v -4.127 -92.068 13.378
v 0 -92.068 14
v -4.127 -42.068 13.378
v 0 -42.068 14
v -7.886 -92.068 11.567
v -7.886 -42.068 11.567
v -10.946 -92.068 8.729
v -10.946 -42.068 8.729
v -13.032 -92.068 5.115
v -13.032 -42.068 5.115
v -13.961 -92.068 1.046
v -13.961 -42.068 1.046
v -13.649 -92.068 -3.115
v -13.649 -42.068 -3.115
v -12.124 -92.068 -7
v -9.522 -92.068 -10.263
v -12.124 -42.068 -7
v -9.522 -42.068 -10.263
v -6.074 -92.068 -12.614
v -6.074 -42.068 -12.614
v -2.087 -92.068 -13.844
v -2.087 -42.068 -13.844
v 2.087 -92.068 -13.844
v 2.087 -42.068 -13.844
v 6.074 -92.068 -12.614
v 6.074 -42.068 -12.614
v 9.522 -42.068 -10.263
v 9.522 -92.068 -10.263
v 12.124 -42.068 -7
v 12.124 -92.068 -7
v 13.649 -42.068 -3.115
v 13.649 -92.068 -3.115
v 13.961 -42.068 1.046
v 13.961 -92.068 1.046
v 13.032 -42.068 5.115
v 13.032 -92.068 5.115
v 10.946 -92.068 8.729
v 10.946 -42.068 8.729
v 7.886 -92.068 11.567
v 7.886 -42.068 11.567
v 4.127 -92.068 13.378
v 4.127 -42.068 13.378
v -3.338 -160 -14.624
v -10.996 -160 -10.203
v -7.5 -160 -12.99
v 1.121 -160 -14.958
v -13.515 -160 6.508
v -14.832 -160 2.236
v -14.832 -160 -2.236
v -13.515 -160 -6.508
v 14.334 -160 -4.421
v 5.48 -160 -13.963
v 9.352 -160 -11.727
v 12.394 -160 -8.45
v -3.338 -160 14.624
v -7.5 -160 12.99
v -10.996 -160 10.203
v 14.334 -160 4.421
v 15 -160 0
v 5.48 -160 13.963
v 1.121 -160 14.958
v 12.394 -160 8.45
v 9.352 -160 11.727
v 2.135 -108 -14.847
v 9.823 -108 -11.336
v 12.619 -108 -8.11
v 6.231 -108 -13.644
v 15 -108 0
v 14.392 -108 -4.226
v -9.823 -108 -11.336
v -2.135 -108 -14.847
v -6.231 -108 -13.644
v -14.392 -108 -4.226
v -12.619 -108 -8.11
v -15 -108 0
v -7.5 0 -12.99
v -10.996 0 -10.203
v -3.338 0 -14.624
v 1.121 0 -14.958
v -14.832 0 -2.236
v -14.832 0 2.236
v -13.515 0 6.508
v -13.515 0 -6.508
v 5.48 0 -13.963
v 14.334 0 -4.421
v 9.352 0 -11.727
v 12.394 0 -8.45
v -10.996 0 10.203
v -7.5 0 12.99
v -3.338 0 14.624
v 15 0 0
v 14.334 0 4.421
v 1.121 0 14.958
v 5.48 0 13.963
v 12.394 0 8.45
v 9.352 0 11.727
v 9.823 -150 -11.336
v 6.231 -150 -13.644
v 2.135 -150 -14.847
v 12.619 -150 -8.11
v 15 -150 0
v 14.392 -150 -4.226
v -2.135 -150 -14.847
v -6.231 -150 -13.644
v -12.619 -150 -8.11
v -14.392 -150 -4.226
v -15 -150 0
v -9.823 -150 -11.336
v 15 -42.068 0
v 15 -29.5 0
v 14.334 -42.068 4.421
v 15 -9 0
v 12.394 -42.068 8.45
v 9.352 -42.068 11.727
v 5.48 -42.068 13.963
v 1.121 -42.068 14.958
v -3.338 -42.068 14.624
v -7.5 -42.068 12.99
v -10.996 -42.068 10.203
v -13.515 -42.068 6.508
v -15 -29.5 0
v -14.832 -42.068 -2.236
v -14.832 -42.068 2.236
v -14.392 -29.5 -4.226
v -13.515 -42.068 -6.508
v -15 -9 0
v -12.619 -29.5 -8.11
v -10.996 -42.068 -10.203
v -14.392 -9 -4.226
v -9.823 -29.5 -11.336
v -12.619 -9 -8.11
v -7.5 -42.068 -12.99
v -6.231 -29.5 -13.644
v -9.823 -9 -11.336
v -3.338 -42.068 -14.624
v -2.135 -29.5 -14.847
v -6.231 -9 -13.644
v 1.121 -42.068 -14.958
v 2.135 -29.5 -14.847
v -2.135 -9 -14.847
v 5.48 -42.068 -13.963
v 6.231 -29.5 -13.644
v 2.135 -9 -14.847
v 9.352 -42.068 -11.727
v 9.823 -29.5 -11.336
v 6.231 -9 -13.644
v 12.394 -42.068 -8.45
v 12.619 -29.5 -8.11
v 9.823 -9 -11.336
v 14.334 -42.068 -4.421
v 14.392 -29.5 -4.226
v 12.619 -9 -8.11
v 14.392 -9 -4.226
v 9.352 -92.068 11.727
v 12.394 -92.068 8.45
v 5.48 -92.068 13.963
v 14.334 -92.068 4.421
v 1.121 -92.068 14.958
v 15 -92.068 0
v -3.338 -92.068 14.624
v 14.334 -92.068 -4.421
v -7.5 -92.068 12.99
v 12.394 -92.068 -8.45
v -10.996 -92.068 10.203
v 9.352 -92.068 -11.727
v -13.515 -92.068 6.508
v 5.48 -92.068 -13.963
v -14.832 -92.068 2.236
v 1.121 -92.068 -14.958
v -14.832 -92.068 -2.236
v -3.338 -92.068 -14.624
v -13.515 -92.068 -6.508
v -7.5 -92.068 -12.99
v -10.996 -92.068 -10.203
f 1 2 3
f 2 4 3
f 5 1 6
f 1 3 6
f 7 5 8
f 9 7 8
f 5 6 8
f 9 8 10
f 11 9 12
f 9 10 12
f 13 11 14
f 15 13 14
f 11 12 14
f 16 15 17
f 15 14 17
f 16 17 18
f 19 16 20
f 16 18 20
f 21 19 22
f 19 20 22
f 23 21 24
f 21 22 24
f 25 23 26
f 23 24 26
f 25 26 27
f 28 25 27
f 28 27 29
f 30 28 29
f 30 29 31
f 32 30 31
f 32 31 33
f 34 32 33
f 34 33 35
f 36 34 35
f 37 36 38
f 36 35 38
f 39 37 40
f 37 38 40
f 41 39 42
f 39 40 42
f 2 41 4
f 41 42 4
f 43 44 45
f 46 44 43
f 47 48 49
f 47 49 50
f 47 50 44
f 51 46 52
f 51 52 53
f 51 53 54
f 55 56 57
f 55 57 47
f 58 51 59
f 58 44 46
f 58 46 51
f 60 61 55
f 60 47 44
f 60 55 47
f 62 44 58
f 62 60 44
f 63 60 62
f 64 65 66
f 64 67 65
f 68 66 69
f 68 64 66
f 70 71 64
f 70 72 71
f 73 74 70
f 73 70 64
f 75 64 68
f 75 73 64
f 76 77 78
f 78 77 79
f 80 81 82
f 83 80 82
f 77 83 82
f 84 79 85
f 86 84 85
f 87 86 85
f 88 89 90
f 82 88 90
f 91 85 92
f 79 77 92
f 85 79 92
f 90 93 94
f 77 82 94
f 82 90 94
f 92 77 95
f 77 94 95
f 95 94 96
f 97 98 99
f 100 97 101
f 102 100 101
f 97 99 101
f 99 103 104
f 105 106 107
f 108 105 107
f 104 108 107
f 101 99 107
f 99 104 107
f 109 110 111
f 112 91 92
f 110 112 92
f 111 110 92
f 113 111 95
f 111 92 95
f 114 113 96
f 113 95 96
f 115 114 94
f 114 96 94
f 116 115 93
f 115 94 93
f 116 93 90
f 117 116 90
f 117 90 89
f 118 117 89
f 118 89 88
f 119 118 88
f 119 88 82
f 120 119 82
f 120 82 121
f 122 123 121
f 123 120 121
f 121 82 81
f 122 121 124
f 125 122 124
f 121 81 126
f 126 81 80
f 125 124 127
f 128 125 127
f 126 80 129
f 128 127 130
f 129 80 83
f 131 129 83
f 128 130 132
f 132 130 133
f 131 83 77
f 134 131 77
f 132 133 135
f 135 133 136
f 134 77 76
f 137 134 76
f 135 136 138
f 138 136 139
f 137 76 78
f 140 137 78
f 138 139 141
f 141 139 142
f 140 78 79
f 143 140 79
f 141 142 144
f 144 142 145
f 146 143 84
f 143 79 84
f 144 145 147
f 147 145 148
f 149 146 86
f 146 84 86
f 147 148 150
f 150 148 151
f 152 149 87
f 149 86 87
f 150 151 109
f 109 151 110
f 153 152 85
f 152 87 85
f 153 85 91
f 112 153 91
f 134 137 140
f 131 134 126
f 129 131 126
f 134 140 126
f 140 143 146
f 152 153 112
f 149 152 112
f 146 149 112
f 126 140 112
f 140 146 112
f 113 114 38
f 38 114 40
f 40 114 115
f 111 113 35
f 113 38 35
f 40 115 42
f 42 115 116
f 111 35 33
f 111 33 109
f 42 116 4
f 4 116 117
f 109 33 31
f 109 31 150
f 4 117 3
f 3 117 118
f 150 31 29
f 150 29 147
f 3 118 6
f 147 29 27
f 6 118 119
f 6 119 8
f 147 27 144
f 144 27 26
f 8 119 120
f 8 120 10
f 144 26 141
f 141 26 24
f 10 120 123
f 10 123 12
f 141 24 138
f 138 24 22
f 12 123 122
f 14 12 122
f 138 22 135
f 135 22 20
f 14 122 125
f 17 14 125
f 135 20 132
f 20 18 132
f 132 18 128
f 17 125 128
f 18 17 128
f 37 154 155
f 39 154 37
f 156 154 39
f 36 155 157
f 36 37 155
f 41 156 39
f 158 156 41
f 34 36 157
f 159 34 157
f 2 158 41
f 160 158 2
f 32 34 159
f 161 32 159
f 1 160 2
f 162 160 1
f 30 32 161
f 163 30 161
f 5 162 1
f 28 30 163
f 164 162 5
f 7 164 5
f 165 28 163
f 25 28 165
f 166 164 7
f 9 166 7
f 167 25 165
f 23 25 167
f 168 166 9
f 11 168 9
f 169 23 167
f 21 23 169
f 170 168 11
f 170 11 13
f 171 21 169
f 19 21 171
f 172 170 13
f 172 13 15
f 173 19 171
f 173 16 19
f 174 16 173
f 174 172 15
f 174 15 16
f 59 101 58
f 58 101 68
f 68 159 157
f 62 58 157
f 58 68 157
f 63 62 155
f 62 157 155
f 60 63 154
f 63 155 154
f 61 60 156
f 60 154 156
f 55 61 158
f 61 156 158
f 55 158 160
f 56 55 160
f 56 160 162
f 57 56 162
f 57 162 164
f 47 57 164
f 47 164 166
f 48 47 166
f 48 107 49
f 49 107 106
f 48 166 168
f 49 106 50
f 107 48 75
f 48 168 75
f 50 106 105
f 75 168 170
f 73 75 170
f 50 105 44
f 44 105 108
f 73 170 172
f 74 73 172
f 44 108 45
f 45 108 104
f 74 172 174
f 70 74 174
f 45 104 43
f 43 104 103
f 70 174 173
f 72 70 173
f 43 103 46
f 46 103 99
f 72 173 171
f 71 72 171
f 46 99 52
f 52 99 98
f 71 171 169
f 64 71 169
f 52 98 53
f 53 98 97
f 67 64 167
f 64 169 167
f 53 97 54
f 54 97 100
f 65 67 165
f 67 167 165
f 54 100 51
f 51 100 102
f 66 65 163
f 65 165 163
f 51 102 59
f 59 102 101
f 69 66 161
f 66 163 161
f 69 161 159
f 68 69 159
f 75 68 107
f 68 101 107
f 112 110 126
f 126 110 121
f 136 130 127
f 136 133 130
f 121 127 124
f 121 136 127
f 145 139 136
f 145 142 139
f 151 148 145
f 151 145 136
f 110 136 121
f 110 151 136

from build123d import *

# Parameters (mm, degrees)
F0_R     = 15
F1_DEPTH = 160
F2_W     = 40
F2_H     = 15
F2_W_2   = 18.5
F3_DEPTH = 15
F4_DEPTH = 12.5
F5_DEPTH = 2
F6_DEPTH = 1
F7_DEPTH = 1
F8_W     = 50
F8_H     = 1


with BuildPart() as f1:
    # F0 (on Front) → F1 (new body)
    with BuildSketch(Plane.XZ):
        Circle(F0_R)
    extrude(amount=F1_DEPTH)

    # F2 (on Right) → F3 (cut, symmetric)
    with BuildSketch(Plane.YZ):
        with Locations((-130, -7.5)):
            Rectangle(F2_W, F2_H)
        with Locations((-19.25, -7.5)):
            Rectangle(F2_W_2, F2_H)
    extrude(amount=F3_DEPTH, both=True, mode=Mode.SUBTRACT)

    # F2 (on Right) → F4 (cut, symmetric)
    with BuildSketch(Plane.YZ):
        with Locations((-19.25, -7.5)):
            Rectangle(F2_W_2, F2_H)
        with Locations((-130, -7.5)):
            Rectangle(F2_W, F2_H)
    extrude(amount=F4_DEPTH, both=True, mode=Mode.SUBTRACT)

    # F5 (cut): a face of the model
    f5_faces = [f1.faces().sort_by_distance(p)[0] for p in [
        (0, -110, -6.3661977237),
    ]]
    extrude(f5_faces, amount=-F5_DEPTH, mode=Mode.SUBTRACT)

    # F6 (cut): a face of the model
    f6_faces = [f1.faces().sort_by_distance(p)[0] for p in [
        (0, -28.5, -6.3661977237),
    ]]
    extrude(f6_faces, amount=-F6_DEPTH, mode=Mode.SUBTRACT)

    # F7 (cut): a face of the model
    f7_faces = [f1.faces().sort_by_distance(p)[0] for p in [
        (0, -10, -6.3661977237),
    ]]
    extrude(f7_faces, amount=-F7_DEPTH, mode=Mode.SUBTRACT)

    # F8 (on Right) → F9 (revolve, cut)
    with BuildSketch(Plane.YZ):
        with Locations((-67.068171382, 14.5)):
            Rectangle(F8_W, F8_H)
    revolve(axis=Axis((0, -80.4968252778, 0), (0, -1, 0)), mode=Mode.SUBTRACT)


solid = f1.part
